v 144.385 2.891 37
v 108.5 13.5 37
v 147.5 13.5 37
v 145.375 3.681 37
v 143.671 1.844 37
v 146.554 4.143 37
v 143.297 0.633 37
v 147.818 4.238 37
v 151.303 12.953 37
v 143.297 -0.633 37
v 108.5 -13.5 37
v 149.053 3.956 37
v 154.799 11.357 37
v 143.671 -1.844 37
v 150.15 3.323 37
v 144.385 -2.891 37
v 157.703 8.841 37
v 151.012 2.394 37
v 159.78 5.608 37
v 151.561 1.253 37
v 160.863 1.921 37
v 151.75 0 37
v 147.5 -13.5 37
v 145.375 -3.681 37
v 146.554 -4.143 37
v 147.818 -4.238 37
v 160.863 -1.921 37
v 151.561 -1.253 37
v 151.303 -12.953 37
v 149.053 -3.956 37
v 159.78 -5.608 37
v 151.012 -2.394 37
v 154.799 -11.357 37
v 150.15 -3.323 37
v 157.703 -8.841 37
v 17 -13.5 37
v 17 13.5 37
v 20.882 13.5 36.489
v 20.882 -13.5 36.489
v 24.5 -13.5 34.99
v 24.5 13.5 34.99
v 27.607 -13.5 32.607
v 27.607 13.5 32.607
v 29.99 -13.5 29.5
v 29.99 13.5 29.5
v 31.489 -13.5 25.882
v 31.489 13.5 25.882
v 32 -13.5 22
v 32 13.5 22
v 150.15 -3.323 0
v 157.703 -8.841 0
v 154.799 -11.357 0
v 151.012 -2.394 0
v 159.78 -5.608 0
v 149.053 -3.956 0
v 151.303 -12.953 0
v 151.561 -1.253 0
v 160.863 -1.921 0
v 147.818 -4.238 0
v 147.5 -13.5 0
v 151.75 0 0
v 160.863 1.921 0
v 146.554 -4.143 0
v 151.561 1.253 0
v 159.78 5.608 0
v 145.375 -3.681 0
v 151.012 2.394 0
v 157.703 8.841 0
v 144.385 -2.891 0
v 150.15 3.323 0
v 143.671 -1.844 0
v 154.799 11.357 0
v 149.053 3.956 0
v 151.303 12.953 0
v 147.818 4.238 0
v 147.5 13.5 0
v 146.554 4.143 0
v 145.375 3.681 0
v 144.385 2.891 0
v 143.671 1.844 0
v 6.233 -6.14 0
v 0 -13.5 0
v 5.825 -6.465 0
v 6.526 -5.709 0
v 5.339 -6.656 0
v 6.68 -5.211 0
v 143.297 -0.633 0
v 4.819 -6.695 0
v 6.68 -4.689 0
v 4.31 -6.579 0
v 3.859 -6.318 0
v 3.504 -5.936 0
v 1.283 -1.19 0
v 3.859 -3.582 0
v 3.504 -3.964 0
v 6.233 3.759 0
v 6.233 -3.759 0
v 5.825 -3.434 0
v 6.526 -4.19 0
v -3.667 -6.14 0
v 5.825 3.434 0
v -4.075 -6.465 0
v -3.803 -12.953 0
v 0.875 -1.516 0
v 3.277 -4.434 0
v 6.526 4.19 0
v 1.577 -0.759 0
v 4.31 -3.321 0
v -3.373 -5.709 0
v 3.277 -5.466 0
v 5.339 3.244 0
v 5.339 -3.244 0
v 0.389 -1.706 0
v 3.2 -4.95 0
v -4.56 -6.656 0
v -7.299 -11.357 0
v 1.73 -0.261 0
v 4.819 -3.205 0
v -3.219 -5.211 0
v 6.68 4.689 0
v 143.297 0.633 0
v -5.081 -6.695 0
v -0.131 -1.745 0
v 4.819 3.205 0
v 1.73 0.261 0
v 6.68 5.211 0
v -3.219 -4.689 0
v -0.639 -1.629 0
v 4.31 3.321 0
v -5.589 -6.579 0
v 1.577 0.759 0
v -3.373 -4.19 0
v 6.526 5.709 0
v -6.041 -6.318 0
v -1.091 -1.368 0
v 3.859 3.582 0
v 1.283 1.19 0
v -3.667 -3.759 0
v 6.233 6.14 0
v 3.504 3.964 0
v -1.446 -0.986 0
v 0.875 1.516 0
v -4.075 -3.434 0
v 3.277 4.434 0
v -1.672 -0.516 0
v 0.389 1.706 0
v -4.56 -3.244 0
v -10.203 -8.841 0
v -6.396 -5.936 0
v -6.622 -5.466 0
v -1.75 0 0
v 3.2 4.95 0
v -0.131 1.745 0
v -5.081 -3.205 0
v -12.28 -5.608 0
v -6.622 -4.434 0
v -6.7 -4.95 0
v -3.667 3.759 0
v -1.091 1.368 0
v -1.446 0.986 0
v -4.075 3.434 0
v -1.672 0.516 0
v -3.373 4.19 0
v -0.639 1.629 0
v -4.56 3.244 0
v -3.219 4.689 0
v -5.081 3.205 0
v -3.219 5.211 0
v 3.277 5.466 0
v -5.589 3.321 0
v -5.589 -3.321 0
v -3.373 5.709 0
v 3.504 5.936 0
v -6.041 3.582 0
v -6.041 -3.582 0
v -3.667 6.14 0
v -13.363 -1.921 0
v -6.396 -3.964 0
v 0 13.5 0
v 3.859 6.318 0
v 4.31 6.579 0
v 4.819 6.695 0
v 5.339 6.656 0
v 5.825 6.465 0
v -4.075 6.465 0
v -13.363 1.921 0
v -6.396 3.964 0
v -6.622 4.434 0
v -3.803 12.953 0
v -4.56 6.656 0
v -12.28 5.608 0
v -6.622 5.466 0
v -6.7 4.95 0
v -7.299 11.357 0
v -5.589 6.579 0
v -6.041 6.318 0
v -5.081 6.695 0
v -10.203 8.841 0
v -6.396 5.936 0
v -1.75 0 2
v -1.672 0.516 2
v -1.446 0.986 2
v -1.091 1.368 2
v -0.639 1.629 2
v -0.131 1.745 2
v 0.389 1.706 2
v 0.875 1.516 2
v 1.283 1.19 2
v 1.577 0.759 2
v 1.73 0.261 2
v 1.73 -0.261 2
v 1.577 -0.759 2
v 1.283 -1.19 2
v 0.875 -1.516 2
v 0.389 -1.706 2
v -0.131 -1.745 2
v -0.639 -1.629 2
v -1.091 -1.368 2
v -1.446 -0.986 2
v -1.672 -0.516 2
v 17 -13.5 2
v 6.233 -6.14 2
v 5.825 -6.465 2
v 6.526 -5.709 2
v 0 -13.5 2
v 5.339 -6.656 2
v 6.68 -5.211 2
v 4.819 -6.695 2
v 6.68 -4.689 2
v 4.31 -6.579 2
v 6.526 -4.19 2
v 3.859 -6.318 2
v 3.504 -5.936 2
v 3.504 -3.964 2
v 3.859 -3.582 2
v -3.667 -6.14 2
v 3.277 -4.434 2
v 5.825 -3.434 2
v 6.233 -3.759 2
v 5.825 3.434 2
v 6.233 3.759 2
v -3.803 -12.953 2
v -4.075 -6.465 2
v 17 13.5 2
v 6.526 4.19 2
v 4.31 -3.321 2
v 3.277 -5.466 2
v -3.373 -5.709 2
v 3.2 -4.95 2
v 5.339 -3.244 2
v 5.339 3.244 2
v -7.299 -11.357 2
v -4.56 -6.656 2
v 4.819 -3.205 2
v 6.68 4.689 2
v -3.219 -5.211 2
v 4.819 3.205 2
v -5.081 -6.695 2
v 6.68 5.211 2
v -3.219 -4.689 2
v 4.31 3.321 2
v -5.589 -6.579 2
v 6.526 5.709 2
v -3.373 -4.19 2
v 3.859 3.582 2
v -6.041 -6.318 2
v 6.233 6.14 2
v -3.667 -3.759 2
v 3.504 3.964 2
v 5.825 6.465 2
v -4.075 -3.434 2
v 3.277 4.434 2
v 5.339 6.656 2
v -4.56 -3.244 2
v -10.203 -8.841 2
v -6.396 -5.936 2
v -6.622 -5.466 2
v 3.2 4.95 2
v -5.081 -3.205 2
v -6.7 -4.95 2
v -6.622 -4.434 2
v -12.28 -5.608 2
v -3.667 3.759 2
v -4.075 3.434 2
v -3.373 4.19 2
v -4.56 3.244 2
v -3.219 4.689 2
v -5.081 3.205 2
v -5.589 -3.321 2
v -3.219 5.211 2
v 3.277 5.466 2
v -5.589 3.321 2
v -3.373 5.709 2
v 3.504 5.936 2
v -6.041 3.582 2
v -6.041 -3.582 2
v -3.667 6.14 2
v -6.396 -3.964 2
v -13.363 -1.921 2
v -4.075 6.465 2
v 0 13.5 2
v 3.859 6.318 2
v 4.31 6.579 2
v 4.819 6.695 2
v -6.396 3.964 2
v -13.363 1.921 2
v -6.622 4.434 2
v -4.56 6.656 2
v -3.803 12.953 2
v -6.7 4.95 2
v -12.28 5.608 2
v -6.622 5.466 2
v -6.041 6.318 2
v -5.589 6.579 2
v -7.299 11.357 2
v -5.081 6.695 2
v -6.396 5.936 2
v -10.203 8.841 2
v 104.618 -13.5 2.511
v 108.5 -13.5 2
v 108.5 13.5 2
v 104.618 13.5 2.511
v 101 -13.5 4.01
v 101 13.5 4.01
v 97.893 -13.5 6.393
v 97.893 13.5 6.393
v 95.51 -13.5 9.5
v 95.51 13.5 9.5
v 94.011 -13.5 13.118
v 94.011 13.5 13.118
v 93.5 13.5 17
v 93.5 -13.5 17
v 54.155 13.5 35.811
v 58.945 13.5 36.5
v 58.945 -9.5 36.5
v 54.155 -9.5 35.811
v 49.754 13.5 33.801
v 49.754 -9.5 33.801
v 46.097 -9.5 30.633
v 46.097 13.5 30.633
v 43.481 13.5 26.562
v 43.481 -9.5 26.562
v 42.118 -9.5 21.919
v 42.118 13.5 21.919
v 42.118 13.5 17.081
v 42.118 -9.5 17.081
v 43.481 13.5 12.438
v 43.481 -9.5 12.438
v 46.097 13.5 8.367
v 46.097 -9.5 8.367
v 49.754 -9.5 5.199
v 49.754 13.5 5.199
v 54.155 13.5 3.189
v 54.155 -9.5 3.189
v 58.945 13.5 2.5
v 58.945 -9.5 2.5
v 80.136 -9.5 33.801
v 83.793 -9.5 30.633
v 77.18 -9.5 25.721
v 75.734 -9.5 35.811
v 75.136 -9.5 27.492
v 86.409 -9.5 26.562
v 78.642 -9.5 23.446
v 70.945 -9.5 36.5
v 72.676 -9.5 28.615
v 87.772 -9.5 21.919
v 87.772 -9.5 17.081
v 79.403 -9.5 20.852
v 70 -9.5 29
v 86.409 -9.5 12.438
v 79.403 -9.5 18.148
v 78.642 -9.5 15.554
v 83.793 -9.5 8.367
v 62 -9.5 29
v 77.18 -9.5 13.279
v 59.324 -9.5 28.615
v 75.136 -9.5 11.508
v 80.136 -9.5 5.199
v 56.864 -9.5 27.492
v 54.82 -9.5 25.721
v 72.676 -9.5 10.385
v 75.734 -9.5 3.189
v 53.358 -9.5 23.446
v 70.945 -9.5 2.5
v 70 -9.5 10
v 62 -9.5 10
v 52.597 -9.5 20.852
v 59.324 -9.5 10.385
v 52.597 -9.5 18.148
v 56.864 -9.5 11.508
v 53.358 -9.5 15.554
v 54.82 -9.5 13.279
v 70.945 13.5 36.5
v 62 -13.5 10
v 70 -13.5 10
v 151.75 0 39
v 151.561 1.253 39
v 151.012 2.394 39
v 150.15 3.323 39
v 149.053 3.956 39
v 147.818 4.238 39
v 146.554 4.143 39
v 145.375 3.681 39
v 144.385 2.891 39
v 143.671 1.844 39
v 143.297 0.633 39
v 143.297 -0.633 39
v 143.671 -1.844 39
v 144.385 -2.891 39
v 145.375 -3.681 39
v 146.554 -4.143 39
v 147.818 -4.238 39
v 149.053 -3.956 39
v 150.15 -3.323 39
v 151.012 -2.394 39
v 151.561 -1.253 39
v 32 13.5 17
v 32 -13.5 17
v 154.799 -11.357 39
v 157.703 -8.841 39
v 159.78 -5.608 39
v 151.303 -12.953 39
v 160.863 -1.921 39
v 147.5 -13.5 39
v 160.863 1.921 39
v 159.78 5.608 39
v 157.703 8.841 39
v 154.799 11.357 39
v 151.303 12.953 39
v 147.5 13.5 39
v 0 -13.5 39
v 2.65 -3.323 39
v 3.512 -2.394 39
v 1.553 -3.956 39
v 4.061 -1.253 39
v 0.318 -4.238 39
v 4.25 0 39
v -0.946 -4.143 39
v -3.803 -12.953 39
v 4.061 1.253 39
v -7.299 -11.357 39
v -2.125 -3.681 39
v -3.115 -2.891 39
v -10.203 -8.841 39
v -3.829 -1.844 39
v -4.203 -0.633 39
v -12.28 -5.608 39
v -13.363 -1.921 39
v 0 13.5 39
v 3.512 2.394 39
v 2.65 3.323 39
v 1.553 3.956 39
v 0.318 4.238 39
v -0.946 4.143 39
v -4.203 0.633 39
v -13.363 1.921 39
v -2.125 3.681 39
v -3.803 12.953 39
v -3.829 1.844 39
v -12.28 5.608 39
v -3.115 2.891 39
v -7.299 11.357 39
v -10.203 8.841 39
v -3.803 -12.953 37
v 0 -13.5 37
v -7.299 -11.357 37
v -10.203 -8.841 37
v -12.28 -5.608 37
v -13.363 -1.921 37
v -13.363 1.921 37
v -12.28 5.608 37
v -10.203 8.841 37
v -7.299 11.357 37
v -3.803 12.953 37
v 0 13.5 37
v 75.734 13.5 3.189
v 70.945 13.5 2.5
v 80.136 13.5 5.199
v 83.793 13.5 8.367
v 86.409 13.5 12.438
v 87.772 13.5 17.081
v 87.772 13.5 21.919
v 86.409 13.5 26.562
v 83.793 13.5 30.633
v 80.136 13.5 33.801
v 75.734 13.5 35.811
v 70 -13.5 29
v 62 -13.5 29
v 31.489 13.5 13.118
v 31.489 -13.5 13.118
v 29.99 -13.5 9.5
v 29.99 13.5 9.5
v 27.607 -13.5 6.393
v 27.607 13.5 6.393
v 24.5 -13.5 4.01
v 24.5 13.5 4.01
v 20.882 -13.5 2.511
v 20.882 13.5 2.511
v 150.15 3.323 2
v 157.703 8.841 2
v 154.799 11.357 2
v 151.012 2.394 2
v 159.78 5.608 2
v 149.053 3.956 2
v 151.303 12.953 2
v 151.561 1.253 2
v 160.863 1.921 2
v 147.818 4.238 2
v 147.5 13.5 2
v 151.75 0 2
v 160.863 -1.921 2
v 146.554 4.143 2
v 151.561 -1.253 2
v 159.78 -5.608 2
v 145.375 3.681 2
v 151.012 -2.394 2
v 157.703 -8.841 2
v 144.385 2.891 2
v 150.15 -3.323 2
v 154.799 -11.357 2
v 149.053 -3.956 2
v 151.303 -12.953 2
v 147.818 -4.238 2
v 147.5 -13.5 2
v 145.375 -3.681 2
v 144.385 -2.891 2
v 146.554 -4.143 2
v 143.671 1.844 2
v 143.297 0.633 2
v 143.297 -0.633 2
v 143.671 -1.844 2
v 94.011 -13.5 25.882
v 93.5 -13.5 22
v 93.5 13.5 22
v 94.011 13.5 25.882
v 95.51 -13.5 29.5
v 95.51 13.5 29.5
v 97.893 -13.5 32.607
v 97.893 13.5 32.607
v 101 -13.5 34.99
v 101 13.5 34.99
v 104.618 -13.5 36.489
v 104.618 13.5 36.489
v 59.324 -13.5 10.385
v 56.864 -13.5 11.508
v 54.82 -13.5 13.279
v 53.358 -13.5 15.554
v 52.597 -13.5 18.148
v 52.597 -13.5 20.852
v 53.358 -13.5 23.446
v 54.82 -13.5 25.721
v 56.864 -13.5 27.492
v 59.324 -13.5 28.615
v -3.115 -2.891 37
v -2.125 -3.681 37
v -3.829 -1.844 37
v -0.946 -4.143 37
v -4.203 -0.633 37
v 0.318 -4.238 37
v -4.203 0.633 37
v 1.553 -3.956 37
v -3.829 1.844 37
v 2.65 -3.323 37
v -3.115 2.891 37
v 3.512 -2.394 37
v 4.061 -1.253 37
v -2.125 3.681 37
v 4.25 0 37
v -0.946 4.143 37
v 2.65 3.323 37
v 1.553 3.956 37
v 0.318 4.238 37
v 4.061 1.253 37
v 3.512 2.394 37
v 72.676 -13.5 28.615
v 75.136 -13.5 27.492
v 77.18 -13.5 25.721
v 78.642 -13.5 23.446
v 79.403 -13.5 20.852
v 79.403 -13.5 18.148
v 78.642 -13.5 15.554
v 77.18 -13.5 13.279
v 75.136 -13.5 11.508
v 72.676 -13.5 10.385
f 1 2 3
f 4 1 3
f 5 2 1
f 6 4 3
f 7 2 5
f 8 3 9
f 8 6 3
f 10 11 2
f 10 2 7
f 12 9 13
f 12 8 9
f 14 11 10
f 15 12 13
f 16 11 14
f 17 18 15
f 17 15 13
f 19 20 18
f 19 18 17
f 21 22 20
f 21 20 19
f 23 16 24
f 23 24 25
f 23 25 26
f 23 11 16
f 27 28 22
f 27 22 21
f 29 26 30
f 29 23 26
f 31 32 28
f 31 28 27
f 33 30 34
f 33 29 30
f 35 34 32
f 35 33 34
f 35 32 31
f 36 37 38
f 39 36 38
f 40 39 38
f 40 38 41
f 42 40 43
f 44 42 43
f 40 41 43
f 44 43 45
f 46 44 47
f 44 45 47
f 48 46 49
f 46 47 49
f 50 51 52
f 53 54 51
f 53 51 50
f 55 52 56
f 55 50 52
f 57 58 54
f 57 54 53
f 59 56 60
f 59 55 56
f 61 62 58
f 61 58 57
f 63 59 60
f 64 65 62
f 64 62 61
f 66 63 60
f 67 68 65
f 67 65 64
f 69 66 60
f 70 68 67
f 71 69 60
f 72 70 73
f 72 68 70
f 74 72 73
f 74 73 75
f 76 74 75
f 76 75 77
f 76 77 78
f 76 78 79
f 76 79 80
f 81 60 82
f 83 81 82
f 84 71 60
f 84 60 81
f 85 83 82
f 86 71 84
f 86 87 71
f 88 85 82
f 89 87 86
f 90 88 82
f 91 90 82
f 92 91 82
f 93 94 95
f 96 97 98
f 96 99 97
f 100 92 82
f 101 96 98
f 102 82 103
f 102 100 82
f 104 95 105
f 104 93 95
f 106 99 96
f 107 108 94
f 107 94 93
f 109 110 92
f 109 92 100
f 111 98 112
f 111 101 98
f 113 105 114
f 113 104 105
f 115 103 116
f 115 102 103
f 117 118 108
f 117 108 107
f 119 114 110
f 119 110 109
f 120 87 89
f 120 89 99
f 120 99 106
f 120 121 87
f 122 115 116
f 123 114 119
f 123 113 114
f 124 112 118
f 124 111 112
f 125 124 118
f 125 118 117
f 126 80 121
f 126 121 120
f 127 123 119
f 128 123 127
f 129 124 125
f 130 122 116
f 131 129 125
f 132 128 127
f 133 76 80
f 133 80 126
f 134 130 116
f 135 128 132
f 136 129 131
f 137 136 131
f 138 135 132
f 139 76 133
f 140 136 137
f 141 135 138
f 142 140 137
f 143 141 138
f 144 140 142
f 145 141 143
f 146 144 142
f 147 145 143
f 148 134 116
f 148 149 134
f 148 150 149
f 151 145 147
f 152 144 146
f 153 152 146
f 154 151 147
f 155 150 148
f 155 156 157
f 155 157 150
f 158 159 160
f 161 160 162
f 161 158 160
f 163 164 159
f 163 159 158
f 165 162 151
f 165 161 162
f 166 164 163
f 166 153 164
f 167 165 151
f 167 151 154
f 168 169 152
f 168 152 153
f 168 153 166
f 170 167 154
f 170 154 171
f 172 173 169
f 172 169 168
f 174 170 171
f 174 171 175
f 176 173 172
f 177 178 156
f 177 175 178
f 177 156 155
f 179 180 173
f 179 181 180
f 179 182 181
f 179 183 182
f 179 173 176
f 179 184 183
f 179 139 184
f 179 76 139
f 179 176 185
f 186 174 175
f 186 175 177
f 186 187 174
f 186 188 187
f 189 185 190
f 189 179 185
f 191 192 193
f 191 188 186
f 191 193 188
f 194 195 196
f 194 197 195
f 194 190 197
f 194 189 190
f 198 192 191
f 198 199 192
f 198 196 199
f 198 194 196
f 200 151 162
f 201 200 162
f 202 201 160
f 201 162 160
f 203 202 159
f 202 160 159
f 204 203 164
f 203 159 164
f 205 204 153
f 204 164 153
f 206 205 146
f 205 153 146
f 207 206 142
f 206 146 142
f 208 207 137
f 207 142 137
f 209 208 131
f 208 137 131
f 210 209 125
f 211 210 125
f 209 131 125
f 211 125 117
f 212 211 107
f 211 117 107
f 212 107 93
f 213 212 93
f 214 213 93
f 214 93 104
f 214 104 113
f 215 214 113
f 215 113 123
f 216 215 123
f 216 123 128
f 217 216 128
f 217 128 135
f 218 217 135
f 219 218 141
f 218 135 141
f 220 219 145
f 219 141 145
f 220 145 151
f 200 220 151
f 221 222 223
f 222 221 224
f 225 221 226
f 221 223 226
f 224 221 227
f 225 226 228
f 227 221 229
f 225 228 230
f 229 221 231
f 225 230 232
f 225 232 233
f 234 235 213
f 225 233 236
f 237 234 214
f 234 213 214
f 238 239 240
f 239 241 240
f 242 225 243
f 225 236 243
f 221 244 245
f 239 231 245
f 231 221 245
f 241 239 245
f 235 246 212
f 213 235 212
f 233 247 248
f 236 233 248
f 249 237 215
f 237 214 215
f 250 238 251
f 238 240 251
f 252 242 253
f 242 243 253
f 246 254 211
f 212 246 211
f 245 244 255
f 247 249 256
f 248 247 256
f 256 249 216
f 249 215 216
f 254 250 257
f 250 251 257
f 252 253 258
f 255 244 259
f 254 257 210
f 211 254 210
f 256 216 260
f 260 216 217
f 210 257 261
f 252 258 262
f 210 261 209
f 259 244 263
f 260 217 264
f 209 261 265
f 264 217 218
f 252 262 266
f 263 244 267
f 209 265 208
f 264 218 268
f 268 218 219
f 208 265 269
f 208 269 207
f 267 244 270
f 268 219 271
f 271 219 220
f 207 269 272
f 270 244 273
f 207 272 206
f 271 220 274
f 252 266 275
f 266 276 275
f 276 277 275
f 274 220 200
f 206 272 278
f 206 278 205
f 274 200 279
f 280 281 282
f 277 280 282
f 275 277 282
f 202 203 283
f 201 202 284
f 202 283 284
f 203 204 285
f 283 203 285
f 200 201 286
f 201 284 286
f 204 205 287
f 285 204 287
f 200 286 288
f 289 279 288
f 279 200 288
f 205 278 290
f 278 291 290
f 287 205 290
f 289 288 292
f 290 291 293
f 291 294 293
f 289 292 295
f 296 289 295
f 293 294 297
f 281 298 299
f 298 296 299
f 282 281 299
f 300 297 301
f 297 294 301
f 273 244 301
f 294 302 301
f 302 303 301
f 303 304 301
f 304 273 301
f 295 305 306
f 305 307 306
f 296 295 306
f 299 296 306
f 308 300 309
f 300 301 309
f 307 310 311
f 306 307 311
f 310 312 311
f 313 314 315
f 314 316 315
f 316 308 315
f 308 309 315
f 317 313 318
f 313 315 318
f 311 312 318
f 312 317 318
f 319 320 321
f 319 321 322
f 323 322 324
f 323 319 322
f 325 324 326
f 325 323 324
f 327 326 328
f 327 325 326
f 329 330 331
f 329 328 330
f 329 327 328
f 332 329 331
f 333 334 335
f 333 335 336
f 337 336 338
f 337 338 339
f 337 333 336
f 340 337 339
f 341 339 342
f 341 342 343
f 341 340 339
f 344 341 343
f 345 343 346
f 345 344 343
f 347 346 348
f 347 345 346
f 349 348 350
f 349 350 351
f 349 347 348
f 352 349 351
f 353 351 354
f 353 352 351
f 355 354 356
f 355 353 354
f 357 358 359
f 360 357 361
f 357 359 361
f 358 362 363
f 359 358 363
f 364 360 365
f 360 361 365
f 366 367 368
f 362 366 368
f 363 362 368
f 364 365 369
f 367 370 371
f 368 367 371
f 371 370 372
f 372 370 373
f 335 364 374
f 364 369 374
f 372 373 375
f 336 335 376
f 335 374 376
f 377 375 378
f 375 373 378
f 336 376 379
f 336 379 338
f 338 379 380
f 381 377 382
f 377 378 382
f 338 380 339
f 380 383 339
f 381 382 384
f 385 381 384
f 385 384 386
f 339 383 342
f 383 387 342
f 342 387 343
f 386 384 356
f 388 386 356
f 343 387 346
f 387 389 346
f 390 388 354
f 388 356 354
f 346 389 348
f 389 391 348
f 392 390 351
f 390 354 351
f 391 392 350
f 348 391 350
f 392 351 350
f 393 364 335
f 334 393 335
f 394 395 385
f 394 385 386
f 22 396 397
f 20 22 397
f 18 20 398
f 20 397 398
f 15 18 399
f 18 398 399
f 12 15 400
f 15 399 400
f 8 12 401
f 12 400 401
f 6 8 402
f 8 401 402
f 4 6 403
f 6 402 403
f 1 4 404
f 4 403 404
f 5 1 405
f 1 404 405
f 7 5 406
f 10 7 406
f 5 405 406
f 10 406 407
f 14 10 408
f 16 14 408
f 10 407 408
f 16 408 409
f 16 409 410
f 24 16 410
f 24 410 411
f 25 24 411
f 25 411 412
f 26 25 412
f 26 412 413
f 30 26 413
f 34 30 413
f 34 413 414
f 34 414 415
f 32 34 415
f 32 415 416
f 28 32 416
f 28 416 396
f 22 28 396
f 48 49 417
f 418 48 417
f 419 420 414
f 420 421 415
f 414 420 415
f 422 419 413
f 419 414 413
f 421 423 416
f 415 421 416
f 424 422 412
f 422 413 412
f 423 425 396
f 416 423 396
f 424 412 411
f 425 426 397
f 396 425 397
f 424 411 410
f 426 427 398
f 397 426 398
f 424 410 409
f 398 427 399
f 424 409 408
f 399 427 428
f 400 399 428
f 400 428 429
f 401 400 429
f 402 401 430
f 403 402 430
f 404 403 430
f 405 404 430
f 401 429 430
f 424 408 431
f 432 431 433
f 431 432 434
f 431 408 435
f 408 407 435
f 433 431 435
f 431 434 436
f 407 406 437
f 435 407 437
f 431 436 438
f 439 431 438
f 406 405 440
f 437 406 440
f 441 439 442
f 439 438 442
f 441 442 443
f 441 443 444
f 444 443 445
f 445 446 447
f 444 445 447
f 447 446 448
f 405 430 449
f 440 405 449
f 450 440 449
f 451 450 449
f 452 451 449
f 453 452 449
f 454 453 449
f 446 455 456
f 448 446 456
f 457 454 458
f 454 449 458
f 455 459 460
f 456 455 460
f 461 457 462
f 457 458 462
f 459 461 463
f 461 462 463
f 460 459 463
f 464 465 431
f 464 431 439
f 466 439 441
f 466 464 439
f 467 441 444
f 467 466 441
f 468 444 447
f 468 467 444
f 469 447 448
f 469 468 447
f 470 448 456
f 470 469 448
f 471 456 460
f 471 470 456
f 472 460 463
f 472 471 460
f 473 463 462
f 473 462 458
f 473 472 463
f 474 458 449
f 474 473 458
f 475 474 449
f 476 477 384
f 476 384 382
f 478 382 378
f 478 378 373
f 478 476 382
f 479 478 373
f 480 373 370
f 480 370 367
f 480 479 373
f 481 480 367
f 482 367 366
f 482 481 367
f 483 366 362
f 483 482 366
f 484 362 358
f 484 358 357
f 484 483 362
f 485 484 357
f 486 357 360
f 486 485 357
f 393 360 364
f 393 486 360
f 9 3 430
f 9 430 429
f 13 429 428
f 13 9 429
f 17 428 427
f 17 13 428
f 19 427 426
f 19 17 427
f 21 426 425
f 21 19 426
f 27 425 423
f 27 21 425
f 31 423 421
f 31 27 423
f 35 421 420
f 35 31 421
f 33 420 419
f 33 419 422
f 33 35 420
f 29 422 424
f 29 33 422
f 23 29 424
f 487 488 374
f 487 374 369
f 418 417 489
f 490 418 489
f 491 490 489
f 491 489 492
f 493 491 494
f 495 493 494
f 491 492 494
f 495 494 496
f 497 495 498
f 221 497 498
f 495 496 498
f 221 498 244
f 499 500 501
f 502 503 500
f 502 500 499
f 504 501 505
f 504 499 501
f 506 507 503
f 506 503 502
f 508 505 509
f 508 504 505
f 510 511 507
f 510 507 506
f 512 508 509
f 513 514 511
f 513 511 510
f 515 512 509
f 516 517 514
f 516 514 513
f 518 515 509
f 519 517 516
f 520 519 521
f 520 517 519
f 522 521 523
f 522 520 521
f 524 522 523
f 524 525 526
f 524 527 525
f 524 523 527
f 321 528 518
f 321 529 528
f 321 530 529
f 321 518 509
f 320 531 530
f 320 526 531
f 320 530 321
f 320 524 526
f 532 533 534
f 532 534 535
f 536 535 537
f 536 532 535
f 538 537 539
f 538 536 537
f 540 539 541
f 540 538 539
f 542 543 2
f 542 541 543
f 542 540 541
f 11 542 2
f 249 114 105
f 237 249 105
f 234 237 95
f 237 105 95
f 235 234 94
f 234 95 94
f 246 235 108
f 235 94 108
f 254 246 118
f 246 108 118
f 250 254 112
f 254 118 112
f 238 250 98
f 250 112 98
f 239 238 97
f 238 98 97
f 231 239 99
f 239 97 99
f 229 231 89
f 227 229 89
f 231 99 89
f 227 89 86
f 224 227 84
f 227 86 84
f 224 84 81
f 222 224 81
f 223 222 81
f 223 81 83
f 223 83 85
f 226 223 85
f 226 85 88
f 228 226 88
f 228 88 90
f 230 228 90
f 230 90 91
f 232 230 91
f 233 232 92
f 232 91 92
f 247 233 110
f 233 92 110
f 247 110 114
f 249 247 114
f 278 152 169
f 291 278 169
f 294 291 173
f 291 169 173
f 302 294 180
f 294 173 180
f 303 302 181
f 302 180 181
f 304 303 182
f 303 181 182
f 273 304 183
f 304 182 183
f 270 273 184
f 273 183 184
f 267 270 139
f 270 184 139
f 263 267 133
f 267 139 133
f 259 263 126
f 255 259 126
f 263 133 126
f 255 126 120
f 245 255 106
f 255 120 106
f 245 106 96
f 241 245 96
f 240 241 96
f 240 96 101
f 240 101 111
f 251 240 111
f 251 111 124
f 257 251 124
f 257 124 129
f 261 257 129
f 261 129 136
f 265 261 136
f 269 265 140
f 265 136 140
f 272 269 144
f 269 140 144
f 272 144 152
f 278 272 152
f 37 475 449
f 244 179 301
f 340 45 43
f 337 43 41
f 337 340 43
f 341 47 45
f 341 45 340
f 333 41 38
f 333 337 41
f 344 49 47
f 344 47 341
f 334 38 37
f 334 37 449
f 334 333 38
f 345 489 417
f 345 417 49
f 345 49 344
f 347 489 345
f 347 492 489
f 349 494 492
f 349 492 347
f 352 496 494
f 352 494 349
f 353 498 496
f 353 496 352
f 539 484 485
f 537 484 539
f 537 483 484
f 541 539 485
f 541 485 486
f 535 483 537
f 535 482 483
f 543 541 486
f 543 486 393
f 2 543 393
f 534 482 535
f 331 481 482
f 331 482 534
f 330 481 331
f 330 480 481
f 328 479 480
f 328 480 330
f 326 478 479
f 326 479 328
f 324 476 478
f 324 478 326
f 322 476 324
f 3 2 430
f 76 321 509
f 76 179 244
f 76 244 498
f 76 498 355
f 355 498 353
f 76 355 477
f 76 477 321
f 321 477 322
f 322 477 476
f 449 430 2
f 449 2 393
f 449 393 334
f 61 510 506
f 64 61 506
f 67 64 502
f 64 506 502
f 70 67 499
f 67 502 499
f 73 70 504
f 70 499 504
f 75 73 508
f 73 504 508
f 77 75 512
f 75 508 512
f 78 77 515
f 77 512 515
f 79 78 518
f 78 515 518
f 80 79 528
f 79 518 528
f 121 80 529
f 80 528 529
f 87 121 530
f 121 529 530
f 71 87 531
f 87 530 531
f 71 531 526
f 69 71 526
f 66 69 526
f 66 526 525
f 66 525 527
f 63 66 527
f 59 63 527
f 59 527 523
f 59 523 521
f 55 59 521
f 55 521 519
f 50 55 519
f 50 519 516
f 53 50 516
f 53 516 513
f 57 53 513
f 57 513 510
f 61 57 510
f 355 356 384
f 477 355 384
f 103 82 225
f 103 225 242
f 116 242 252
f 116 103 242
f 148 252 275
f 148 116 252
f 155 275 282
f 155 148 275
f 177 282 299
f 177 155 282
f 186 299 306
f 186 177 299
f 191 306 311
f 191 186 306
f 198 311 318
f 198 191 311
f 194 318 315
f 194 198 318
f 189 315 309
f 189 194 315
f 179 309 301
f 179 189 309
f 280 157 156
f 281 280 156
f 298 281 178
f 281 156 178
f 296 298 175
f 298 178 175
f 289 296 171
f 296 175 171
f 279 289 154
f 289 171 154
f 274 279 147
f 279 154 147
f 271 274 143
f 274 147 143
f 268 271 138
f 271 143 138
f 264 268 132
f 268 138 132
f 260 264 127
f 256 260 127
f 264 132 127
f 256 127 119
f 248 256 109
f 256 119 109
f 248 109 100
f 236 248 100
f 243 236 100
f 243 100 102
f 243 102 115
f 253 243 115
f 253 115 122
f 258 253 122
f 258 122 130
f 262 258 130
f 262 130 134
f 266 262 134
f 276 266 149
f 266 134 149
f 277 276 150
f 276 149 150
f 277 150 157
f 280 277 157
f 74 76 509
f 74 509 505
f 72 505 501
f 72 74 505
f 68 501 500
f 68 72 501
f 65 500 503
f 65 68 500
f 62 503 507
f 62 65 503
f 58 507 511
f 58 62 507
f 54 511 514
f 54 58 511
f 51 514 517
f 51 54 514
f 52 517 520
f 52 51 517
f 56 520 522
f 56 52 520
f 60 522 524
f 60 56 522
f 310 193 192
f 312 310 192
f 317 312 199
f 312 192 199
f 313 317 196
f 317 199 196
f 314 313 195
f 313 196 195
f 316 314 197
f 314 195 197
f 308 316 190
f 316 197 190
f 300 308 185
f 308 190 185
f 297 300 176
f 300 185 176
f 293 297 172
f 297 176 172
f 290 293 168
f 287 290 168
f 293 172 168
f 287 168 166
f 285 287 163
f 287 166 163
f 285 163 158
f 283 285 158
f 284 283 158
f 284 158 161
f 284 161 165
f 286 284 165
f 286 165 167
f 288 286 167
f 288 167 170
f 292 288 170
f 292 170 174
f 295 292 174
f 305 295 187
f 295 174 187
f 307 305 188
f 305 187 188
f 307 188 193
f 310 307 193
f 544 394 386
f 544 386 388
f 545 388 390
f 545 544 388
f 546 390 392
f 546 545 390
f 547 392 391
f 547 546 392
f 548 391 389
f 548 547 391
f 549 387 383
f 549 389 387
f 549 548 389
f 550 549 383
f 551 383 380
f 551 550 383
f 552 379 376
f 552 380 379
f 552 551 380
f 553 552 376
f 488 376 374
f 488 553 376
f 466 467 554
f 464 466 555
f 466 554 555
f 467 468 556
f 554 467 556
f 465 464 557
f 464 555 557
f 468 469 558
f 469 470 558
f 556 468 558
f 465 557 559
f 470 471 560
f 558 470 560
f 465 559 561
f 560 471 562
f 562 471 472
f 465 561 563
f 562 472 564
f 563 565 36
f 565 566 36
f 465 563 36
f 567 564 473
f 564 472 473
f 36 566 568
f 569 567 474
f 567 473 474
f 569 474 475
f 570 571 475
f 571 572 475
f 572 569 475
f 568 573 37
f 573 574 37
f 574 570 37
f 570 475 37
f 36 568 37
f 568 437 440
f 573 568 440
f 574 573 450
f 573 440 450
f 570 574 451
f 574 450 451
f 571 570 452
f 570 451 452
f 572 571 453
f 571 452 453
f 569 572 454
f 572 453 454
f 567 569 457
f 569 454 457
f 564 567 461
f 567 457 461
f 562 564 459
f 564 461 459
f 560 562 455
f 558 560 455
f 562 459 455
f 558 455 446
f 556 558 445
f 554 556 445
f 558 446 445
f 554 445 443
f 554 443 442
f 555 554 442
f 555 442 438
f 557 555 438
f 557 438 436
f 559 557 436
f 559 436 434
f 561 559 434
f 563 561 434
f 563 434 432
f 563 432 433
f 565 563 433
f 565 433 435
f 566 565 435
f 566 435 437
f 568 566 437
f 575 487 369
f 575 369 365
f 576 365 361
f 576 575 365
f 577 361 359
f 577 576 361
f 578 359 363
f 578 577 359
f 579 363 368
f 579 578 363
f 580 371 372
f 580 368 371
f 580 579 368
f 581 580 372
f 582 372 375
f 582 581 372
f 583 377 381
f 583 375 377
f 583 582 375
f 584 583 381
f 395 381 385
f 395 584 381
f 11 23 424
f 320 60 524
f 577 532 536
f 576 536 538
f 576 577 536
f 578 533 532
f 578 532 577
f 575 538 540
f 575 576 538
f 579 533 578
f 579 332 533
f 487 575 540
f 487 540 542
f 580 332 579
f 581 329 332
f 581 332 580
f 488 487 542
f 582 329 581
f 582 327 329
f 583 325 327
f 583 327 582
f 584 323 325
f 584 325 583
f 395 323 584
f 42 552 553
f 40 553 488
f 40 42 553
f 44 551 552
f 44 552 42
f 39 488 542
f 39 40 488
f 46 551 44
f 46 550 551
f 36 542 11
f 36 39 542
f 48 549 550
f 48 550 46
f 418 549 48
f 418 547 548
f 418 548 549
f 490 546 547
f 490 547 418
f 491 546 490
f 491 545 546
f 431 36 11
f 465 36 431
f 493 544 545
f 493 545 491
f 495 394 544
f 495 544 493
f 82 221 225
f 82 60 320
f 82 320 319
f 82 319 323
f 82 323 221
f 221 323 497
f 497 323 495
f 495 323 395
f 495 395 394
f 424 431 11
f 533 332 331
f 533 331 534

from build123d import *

# Parameters (mm, degrees)
EXTRUDE_1_DEPTH      = 39
SKETCH_2_OUTSIDE_W   = 212.666
SKETCH_2_OUTSIDE_H   = 65.166
SKETCH_2_OUTSIDE_R   = 4.25
CUT_EXTRUDE_2_DEPTH  = 40
CUT_EXTRUDE_4_DEPTH  = 28
CUT_EXTRUDE_7_DEPTH  = 28
CUT_EXTRUDE_9_DEPTH  = 23
CUT_EXTRUDE_10_DEPTH = 28
SKETCH_17_R          = 1.75
CUT_EXTRUDE_13_DEPTH = 2
CUT_EXTRUDE_16_REACH = 41
SKETCH_21_R          = 4.25


with BuildPart() as part:
    # 草图1 → 凸台-拉伸1 (new body)
    with BuildSketch(Plane.XY):
        with BuildLine():
            Line((0, 13.5), (147.5, 13.5))
            ThreePointArc((147.5, 13.5), (161, 0), (147.5, -13.5))
            Line((147.5, -13.5), (0, -13.5))
            ThreePointArc((0, -13.5), (-13.5, 0), (0, 13.5))
        make_face()
    extrude(amount=EXTRUDE_1_DEPTH)

    # 草图2 outside → 切除-拉伸2 (cut, through all)
    with BuildSketch(Plane.XY.offset(39)):
        with Locations((73.75, 0)):
            Rectangle(SKETCH_2_OUTSIDE_W, SKETCH_2_OUTSIDE_H)
        with BuildLine():
            Line((0, -13.5), (147.5, -13.5))
            ThreePointArc((147.5, -13.5), (161, 0), (147.5, 13.5))
            Line((147.5, 13.5), (0, 13.5))
            ThreePointArc((0, 13.5), (-13.5, 0), (0, -13.5))
        make_face(mode=Mode.SUBTRACT)
        with Locations((147.5, 0)):
            Circle(SKETCH_2_OUTSIDE_R)
    extrude(amount=-CUT_EXTRUDE_2_DEPTH, mode=Mode.SUBTRACT)

    # 草图5 → 切除-拉伸4 (cut, through all)
    with BuildSketch(Plane(origin=(0, 13.5, 0), x_dir=(1, 0, 0), z_dir=(0, 1, 0))):
        with BuildLine():
            Line((-32, -37), (17, -37))
            ThreePointArc((17, -37), (27.606601718, -32.606601718), (32, -22))
            Line((32, -22), (32, -17))
            ThreePointArc((32, -17), (27.606601718, -6.393398282), (17, -2))
            Line((17, -2), (-32, -2))
            Line((-32, -2), (-32, -37))
        make_face()
    extrude(amount=-CUT_EXTRUDE_4_DEPTH, mode=Mode.SUBTRACT)

    # 草图11 → 切除-拉伸7 (cut, through all)
    with BuildSketch(Plane.XZ.offset(13.5)):
        with BuildLine():
            Line((108.5, 37), (201.5, 37))
            Line((201.5, 37), (201.5, 2))
            Line((201.5, 2), (108.5, 2))
            ThreePointArc((108.5, 2), (97.893398282, 6.393398282), (93.5, 17))
            Line((93.5, 17), (93.5, 22))
            ThreePointArc((93.5, 22), (97.893398282, 32.606601718), (108.5, 37))
        make_face()
    extrude(amount=-CUT_EXTRUDE_7_DEPTH, mode=Mode.SUBTRACT)

    # 草图14 → 切除-拉伸9 (cut)
    with BuildSketch(Plane(origin=(0, 13.5, 0), x_dir=(1, 0, 0), z_dir=(0, 1, 0))):
        with BuildLine():
            Line((58.944791853, -2.5), (70.944791853, -2.5))
            ThreePointArc((70.944791853, -2.5), (87.944791853, -19.5), (70.944791853, -36.5))
            Line((70.944791853, -36.5), (58.944791853, -36.5))
            ThreePointArc((58.944791853, -36.5), (41.944791853, -19.5), (58.944791853, -2.5))
        make_face()
    extrude(amount=-CUT_EXTRUDE_9_DEPTH, mode=Mode.SUBTRACT)

    # 草图16 → 切除-拉伸10 (cut, through all)
    with BuildSketch(Plane.XZ.offset(13.5)):
        with BuildLine():
            Line((62, 29), (70, 29))
            ThreePointArc((70, 29), (79.5, 19.5), (70, 10))
            Line((70, 10), (62, 10))
            ThreePointArc((62, 10), (52.5, 19.5), (62, 29))
        make_face()
    extrude(amount=-CUT_EXTRUDE_10_DEPTH, mode=Mode.SUBTRACT)

    # 草图17 → 切除-拉伸13 (cut)
    with BuildSketch(Plane(origin=(0, 0, 0), x_dir=(-1, 0, 0), z_dir=(0, 0, -1))):
        with Locations((-4.949747468, 4.949747468)):
            Circle(SKETCH_17_R)
        with Locations((4.949747468, 4.949747468)):
            Circle(SKETCH_17_R)
        with Locations((-4.949747468, -4.949747468)):
            Circle(SKETCH_17_R)
        with Locations((4.949747468, -4.949747468)):
            Circle(SKETCH_17_R)
        Circle(SKETCH_17_R)
    extrude(amount=-CUT_EXTRUDE_13_DEPTH, mode=Mode.SUBTRACT)

    # 草图21 → 切除-拉伸16 (cut, up to next)
    with BuildSketch(Plane.XY.offset(39), mode=Mode.PRIVATE) as cut_extrude_16_sk1:
        Circle(SKETCH_21_R)
    cut_extrude_16_tool1 = extrude(cut_extrude_16_sk1.sketch, amount=-CUT_EXTRUDE_16_REACH, mode=Mode.PRIVATE) & part.part
    add(cut_extrude_16_tool1.solids().sort_by_distance((0, 0, 39))[0], mode=Mode.SUBTRACT)


solid = part.part
